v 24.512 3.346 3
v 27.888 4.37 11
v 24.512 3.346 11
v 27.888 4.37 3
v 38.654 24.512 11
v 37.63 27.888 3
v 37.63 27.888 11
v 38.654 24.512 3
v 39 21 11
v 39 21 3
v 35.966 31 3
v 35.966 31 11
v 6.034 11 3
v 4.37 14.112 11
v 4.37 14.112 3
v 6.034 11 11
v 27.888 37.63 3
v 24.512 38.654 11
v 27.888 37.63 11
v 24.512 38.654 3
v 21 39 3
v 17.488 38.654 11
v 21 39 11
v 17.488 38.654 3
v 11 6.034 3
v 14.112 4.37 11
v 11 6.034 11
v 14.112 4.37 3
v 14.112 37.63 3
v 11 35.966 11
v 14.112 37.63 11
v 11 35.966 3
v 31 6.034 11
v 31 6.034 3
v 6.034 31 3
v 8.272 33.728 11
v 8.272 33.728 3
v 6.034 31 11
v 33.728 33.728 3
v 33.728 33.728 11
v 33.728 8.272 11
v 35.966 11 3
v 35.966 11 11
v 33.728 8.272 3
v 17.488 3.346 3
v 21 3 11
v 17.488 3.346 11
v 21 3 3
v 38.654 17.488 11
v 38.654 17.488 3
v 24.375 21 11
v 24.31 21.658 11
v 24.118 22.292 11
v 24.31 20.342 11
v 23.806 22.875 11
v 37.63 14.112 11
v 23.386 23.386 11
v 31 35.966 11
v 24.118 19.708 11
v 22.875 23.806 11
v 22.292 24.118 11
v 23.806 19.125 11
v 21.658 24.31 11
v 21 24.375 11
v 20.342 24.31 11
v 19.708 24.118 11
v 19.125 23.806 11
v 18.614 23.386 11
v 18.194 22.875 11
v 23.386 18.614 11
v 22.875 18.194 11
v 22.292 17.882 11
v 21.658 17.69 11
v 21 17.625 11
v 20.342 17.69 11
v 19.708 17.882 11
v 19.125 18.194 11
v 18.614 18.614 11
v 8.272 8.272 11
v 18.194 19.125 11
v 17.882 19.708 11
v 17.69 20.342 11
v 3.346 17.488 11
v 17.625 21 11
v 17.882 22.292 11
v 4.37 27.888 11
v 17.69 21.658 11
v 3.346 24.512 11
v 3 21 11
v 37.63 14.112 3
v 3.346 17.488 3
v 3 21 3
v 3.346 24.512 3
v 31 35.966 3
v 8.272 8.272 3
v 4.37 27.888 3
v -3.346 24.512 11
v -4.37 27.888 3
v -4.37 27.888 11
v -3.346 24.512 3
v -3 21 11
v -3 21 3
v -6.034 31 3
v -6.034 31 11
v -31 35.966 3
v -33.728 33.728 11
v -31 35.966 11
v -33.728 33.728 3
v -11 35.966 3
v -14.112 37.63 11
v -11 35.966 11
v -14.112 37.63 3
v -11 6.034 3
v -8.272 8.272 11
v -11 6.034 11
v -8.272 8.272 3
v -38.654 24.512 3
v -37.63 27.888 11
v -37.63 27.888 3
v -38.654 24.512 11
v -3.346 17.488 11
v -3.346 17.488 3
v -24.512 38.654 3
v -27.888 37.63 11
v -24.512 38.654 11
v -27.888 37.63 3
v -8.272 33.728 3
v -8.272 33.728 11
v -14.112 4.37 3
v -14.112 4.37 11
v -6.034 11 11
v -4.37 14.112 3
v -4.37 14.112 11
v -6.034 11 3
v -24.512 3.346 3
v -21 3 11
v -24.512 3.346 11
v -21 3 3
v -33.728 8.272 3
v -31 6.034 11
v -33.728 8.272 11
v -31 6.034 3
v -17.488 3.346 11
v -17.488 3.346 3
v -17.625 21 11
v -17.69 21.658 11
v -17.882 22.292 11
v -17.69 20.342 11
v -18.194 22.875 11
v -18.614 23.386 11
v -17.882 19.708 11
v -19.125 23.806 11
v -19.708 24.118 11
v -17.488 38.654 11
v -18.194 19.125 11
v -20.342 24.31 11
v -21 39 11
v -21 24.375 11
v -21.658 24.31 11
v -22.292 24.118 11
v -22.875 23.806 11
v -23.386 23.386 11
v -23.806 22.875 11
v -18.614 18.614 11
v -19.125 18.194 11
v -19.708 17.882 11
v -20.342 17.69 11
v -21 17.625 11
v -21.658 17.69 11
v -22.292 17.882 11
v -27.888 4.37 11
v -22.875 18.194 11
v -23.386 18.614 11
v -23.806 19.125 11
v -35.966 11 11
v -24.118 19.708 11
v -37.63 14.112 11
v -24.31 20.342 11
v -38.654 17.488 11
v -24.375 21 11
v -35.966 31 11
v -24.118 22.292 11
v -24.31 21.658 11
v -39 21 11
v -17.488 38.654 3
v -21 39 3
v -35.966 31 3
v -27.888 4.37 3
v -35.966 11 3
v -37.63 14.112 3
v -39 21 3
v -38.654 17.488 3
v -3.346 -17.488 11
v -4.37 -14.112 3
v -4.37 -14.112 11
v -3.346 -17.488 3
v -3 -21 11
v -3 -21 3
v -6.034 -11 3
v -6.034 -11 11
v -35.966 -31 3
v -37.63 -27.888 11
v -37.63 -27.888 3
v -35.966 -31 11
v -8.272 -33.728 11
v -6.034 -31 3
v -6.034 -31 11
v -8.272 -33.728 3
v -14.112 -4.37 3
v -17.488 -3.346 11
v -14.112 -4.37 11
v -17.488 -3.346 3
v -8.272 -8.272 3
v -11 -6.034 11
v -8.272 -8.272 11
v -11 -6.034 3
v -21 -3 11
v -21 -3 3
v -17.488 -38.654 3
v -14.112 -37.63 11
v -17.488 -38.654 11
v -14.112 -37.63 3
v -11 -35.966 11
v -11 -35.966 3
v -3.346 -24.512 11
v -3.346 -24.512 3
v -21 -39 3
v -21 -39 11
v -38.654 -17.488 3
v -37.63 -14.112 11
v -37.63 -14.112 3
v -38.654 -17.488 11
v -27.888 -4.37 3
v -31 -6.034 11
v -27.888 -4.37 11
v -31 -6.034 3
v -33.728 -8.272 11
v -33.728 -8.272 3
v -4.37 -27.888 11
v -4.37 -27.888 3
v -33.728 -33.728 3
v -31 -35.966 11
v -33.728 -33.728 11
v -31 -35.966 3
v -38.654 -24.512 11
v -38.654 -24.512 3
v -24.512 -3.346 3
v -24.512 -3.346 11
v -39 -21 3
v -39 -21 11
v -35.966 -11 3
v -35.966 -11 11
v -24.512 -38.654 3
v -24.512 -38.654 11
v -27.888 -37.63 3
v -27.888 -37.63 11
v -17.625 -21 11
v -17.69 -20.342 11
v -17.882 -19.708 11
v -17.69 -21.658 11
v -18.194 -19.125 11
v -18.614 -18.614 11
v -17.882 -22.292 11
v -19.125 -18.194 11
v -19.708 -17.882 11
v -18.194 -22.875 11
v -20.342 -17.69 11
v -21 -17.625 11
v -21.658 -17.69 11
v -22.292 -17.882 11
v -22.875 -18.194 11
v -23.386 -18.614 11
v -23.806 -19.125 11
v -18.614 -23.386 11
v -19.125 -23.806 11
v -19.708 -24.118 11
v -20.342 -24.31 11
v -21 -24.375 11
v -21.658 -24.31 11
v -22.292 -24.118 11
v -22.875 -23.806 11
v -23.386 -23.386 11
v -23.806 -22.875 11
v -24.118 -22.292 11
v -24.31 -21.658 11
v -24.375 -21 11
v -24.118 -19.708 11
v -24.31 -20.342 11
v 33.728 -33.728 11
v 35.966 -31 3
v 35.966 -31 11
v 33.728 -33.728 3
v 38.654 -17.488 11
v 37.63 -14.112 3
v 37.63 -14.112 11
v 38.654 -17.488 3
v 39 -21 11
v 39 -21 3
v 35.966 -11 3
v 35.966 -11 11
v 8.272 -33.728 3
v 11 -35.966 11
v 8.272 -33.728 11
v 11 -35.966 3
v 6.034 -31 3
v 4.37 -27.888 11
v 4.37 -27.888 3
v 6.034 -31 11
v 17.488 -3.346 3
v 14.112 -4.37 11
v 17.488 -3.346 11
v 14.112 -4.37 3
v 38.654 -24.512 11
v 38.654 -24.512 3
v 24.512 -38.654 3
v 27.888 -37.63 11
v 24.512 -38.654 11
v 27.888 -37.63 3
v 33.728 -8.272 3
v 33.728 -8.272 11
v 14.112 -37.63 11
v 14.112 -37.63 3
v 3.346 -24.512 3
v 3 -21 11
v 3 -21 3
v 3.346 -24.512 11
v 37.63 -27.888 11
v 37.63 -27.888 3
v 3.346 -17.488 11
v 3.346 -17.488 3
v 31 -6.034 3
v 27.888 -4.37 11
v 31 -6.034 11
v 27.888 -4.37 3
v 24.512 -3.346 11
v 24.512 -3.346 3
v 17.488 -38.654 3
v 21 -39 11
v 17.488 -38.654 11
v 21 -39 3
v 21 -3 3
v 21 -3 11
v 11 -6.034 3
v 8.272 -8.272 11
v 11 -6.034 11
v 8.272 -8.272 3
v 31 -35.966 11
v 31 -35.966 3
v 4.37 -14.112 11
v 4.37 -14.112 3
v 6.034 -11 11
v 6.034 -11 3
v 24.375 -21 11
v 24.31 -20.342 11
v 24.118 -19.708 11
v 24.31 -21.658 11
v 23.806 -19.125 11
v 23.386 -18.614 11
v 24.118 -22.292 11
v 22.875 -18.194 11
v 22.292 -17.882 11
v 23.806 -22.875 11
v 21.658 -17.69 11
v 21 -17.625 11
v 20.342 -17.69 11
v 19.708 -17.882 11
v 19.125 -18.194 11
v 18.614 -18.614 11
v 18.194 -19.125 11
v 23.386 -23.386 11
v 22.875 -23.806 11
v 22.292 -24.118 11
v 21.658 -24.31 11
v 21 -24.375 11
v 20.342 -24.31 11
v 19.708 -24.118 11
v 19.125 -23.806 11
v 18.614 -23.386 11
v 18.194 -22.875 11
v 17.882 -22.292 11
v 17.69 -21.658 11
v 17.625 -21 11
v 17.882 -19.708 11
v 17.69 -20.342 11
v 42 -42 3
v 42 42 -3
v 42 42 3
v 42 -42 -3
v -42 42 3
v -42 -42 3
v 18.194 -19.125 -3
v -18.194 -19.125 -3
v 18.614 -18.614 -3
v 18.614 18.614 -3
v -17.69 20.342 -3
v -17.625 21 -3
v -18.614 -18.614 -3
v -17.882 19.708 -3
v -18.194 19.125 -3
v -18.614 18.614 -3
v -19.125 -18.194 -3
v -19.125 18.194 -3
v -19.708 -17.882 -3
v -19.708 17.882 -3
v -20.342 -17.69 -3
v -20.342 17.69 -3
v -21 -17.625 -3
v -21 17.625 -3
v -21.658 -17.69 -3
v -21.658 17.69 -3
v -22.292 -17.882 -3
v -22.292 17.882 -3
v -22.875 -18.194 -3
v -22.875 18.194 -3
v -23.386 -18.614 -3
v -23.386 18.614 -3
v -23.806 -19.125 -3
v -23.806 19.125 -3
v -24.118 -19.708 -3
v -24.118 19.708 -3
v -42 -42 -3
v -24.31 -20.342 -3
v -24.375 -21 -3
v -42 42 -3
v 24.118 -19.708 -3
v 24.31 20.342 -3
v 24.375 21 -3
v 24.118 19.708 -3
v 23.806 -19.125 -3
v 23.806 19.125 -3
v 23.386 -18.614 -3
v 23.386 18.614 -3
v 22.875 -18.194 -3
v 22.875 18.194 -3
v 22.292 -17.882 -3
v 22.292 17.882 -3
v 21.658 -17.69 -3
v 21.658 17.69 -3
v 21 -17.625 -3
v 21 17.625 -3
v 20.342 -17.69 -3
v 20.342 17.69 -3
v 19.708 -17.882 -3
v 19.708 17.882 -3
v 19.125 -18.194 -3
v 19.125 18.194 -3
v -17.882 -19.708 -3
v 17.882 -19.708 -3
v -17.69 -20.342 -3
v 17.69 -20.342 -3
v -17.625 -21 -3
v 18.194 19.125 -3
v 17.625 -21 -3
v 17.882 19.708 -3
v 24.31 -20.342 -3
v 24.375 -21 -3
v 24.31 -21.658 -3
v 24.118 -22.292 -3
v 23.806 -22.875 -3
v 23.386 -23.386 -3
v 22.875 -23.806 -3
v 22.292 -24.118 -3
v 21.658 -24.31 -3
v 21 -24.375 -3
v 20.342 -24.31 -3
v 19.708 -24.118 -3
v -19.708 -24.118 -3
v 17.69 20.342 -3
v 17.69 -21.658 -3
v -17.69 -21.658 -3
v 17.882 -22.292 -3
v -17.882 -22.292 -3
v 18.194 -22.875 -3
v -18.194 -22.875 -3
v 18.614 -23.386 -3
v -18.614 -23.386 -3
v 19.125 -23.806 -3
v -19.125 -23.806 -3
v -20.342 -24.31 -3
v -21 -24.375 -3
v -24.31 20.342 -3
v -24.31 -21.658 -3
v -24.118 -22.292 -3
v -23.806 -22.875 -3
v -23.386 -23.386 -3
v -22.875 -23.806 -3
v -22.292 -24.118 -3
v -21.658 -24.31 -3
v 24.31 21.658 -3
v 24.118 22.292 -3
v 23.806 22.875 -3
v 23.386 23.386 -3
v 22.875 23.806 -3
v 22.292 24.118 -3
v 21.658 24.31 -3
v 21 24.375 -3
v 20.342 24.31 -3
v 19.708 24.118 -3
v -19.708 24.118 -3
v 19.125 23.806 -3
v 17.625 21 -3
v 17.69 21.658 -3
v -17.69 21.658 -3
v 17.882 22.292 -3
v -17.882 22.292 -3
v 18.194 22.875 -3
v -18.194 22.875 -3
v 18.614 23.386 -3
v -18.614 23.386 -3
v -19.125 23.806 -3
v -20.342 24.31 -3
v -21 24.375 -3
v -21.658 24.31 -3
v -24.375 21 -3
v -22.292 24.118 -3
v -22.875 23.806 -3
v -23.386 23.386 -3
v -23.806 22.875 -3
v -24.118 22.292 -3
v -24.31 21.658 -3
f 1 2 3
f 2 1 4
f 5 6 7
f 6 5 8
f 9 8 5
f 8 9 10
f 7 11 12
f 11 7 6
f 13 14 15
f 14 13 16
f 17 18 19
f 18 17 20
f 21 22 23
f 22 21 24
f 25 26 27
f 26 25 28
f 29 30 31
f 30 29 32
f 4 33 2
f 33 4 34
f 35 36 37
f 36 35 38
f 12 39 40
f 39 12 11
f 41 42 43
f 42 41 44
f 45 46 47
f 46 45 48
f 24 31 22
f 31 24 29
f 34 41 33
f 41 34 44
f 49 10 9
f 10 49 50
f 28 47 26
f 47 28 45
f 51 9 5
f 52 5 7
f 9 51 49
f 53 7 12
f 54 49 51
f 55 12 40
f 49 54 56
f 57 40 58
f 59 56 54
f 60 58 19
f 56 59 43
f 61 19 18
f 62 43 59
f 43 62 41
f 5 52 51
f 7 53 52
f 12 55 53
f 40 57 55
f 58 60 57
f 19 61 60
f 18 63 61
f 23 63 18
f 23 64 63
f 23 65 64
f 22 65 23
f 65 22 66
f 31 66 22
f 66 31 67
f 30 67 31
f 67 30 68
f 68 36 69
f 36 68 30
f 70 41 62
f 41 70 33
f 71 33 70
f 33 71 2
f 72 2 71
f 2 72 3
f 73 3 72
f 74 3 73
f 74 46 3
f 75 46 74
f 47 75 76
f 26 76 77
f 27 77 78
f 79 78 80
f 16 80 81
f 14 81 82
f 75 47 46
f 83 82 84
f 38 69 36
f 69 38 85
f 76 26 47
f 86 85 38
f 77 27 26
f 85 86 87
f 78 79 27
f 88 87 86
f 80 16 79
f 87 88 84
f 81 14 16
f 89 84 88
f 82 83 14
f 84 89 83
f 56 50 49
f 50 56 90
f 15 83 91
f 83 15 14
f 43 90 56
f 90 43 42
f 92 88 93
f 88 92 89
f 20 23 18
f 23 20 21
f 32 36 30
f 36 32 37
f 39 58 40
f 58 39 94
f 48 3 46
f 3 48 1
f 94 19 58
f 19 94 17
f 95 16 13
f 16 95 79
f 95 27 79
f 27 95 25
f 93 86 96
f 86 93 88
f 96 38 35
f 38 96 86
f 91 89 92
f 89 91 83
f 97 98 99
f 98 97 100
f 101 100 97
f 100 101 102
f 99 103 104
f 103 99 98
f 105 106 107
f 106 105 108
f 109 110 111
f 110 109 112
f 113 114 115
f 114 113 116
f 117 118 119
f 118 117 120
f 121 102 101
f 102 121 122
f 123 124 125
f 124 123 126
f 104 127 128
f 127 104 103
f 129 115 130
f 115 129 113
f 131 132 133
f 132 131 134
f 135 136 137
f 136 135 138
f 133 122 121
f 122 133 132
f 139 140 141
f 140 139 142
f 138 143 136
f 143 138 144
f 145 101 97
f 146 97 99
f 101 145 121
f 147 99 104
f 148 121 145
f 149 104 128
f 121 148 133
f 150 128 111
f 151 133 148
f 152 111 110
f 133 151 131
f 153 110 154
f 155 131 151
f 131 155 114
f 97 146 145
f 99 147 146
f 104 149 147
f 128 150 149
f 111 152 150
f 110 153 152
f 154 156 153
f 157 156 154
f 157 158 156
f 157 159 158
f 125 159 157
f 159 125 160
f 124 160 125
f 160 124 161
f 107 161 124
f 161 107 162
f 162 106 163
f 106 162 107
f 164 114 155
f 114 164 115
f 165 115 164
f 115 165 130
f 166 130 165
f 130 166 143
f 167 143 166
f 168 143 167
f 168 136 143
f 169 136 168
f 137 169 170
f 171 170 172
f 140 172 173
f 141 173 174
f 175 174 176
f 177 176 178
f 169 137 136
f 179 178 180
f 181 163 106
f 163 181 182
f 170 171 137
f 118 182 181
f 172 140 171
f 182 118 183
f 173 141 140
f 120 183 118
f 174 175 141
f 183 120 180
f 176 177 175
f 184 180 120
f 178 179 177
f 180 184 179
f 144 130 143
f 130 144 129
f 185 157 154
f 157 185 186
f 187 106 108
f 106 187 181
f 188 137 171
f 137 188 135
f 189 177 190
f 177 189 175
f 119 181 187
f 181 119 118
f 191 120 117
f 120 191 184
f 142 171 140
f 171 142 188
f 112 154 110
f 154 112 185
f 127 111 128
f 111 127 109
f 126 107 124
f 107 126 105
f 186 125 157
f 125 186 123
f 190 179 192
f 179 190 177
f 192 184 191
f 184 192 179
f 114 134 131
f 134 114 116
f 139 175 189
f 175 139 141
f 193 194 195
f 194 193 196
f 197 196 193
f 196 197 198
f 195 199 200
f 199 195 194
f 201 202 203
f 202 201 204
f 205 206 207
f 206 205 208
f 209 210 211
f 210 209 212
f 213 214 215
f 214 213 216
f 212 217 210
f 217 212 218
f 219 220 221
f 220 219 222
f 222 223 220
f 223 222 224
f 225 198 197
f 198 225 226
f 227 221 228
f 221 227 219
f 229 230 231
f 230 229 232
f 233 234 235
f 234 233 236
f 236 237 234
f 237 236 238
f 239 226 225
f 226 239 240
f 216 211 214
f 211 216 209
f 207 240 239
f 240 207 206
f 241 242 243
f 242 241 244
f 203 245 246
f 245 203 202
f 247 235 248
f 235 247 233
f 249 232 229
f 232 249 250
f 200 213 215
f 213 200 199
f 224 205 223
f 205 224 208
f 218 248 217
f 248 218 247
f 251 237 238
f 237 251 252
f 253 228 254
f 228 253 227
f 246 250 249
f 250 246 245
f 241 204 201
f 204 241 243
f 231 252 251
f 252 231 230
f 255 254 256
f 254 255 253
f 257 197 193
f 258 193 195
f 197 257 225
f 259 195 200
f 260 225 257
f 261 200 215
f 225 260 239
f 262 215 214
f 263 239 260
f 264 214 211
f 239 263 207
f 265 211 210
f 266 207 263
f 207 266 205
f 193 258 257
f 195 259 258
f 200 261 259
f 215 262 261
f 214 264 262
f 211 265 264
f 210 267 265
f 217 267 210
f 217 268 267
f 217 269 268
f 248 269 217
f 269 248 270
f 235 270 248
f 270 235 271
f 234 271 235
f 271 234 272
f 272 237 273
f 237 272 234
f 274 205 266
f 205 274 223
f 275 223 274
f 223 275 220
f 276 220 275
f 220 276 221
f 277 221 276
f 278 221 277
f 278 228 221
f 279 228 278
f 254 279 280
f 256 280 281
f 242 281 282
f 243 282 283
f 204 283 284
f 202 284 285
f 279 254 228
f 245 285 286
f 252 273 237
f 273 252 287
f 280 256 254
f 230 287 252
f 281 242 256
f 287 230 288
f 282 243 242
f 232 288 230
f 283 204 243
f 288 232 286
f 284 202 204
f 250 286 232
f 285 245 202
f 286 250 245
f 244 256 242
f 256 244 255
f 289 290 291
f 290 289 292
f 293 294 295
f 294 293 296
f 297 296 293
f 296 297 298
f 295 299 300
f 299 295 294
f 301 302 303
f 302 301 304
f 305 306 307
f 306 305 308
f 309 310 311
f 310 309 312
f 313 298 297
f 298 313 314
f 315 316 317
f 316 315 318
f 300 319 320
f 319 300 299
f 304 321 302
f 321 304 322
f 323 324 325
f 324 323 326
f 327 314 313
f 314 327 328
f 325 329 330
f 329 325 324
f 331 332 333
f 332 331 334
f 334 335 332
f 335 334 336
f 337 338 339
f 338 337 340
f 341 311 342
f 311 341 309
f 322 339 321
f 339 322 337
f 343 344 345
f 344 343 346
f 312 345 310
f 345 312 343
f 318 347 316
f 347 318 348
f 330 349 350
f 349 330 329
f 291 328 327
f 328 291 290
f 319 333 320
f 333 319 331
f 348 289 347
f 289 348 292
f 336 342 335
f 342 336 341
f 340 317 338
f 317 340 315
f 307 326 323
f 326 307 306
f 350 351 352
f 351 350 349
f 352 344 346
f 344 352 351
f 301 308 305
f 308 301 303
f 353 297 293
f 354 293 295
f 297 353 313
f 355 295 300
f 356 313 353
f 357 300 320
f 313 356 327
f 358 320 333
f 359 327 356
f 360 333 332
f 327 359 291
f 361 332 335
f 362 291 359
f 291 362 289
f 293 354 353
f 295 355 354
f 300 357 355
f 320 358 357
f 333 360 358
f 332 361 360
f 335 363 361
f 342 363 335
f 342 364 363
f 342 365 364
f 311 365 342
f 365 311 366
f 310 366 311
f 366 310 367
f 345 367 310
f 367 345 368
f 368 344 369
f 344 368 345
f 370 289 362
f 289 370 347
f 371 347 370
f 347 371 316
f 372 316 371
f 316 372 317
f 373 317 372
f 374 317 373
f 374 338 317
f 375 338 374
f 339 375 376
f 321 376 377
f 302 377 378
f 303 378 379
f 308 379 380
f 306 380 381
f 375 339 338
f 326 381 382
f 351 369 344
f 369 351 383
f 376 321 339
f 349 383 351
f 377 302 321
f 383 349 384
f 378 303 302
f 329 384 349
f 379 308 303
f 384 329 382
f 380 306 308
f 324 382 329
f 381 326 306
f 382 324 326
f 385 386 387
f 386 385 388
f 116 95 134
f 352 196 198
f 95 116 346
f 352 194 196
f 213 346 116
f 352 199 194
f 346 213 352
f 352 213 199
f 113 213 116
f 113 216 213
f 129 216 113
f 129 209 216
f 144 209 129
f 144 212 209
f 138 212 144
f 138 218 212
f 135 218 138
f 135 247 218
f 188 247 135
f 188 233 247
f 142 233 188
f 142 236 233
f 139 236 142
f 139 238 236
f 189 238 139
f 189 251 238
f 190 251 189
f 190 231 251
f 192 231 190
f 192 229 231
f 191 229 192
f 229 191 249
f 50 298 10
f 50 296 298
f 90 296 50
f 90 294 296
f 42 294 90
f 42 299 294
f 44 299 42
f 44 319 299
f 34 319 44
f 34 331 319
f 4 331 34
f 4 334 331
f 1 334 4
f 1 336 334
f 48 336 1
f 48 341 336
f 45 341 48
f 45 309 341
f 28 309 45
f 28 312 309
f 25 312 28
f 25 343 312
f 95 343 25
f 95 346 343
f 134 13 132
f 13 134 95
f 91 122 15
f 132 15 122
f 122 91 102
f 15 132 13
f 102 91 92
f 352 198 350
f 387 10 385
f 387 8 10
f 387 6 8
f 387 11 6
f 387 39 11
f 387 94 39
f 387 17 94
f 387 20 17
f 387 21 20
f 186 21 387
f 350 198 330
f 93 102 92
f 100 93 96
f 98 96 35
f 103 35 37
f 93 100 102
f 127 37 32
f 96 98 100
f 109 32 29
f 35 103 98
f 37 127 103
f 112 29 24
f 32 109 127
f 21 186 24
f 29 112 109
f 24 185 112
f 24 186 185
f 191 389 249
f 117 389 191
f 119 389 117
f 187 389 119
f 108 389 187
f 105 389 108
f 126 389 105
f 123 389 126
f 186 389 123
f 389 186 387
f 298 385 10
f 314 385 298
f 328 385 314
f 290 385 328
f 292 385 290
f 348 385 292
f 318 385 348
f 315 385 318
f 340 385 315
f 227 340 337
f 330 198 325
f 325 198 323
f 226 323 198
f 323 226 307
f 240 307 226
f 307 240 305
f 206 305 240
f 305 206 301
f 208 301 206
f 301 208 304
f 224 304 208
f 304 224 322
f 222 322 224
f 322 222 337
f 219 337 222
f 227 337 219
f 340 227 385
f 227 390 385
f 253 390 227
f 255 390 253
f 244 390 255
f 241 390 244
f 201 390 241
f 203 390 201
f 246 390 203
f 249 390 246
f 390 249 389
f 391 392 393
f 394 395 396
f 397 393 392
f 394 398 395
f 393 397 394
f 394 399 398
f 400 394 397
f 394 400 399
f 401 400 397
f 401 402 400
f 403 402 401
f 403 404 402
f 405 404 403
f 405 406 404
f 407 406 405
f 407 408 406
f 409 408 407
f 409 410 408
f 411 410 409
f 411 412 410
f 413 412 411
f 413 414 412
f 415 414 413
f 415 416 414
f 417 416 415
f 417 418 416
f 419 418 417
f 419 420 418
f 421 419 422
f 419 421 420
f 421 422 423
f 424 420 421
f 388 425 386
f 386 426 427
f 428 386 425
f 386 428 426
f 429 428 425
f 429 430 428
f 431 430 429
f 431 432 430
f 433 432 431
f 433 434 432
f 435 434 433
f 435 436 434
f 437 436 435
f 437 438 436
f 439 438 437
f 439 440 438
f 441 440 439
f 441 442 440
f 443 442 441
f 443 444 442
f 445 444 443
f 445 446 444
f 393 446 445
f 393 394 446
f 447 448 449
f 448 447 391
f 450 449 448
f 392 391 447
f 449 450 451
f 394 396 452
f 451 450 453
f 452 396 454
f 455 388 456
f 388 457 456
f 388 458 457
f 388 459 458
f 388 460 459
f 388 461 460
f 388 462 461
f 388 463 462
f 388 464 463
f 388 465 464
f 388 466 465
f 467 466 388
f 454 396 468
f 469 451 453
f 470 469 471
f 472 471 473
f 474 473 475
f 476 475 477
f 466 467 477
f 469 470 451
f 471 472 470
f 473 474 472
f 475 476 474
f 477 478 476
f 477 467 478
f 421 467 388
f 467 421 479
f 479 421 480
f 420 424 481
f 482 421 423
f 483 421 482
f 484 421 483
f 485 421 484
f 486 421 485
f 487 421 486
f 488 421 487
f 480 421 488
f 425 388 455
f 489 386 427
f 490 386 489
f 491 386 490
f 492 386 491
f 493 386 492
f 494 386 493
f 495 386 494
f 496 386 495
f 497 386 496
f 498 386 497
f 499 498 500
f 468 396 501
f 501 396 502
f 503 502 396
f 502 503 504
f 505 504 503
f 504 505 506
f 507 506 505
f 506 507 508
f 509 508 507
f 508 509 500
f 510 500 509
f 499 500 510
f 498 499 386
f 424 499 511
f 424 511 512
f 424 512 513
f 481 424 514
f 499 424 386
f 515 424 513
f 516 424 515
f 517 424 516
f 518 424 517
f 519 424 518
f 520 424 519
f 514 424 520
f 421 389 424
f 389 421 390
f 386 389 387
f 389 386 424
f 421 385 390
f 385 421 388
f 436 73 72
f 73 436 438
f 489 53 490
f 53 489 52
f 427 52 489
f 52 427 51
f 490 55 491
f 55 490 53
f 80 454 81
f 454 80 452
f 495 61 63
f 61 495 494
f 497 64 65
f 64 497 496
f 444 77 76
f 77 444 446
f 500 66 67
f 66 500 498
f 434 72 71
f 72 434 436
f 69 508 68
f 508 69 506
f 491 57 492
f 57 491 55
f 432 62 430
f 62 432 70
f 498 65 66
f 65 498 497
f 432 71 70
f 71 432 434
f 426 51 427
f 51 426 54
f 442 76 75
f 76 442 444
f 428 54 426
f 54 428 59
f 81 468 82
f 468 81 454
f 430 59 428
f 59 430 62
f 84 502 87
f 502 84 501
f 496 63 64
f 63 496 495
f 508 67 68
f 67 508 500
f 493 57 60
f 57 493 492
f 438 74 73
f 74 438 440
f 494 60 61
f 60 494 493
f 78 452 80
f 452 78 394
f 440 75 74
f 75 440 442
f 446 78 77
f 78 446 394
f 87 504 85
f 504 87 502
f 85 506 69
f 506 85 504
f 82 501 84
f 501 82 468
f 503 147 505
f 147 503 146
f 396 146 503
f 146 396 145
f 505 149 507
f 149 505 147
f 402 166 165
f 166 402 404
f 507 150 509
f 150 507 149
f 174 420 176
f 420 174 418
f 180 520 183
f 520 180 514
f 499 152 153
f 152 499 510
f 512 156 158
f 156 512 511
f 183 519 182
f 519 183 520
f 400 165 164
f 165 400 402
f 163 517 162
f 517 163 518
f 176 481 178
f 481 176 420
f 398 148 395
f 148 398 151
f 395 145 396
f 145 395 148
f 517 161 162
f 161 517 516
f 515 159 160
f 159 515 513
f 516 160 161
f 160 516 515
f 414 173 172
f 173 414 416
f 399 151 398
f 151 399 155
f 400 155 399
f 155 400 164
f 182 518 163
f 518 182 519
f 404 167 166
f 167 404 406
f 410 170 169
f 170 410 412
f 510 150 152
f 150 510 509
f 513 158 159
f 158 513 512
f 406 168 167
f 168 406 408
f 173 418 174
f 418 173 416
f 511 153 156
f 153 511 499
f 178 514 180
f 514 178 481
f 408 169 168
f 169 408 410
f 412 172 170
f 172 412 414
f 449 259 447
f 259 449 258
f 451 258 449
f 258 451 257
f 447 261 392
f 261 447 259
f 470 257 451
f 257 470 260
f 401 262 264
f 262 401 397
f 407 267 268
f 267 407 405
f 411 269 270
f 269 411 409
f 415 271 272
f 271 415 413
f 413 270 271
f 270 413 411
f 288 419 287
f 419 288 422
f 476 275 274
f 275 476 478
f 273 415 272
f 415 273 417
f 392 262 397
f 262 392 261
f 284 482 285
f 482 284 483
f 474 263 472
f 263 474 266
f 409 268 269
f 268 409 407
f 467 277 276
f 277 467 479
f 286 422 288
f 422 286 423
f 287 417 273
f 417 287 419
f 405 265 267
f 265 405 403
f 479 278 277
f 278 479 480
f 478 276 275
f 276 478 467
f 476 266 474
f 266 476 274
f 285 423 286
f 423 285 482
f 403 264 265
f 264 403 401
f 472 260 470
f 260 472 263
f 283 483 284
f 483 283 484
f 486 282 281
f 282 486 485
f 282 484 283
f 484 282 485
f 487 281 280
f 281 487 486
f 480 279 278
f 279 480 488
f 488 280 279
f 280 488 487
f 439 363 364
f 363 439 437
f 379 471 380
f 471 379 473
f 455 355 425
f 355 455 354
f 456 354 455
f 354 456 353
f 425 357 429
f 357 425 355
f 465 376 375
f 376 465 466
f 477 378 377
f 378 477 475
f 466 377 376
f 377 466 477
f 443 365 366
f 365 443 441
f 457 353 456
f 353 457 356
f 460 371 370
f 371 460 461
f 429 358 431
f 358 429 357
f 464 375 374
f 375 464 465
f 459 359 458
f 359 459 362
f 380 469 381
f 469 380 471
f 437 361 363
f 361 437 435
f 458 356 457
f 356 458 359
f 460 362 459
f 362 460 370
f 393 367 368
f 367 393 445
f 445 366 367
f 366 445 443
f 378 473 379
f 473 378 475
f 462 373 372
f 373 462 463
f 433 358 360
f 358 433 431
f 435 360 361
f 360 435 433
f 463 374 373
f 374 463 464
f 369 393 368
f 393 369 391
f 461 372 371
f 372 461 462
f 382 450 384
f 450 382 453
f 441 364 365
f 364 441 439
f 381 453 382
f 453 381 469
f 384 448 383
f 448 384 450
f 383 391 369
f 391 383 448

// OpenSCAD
$fn = 32;

// ----------------------------------------------------------------------
// Anchor pads 84 x 84 x 14
// four corner bosses with anchor holes
// ----------------------------------------------------------------------

// --- parameters (mm) ---
plate = [84, 84, 6];     // base plate size (x, y, z)
pads = 4;                // boss count, one per corner
edge = 21;               // boss centre offset from the plate edge
boss_d = 36;             // boss diameter
boss_h = 8;              // boss height above the base plate
bore_d = 6.6;            // nominal hole diameter from the drawing
print_allowance = 0.15;  // clearance added for printing

// --- derived feature positions (mm) ---
hole_d = bore_d + print_allowance;  // = 6.75   hole diameter as printed
height = plate[2] + boss_h;         // = 14   overall height of the part
corner_x = plate[0] / 2 - edge;     // = 21   boss centre X
corner_y = plate[1] / 2 - edge;     // = 21   boss centre Y
feature_centers = [
  [corner_x, corner_y],
  [-corner_x, corner_y],
  [-corner_x, -corner_y],
  [corner_x, -corner_y]
];   // boss centres, anchor holes are drilled there

// base plate, four bosses standing on it, anchor holes all the way through
difference() {
  union() {
    cube(plate, center = true);
    for (centre = feature_centers)
      translate([centre[0], centre[1], plate[2] / 2 - 1])
        cylinder(d = boss_d, h = boss_h + 1);
  }
  for (centre = feature_centers)
    translate([centre[0], centre[1], -height])
      cylinder(d = hole_d, h = 2 * height + 2);  // through boss and plate
}
